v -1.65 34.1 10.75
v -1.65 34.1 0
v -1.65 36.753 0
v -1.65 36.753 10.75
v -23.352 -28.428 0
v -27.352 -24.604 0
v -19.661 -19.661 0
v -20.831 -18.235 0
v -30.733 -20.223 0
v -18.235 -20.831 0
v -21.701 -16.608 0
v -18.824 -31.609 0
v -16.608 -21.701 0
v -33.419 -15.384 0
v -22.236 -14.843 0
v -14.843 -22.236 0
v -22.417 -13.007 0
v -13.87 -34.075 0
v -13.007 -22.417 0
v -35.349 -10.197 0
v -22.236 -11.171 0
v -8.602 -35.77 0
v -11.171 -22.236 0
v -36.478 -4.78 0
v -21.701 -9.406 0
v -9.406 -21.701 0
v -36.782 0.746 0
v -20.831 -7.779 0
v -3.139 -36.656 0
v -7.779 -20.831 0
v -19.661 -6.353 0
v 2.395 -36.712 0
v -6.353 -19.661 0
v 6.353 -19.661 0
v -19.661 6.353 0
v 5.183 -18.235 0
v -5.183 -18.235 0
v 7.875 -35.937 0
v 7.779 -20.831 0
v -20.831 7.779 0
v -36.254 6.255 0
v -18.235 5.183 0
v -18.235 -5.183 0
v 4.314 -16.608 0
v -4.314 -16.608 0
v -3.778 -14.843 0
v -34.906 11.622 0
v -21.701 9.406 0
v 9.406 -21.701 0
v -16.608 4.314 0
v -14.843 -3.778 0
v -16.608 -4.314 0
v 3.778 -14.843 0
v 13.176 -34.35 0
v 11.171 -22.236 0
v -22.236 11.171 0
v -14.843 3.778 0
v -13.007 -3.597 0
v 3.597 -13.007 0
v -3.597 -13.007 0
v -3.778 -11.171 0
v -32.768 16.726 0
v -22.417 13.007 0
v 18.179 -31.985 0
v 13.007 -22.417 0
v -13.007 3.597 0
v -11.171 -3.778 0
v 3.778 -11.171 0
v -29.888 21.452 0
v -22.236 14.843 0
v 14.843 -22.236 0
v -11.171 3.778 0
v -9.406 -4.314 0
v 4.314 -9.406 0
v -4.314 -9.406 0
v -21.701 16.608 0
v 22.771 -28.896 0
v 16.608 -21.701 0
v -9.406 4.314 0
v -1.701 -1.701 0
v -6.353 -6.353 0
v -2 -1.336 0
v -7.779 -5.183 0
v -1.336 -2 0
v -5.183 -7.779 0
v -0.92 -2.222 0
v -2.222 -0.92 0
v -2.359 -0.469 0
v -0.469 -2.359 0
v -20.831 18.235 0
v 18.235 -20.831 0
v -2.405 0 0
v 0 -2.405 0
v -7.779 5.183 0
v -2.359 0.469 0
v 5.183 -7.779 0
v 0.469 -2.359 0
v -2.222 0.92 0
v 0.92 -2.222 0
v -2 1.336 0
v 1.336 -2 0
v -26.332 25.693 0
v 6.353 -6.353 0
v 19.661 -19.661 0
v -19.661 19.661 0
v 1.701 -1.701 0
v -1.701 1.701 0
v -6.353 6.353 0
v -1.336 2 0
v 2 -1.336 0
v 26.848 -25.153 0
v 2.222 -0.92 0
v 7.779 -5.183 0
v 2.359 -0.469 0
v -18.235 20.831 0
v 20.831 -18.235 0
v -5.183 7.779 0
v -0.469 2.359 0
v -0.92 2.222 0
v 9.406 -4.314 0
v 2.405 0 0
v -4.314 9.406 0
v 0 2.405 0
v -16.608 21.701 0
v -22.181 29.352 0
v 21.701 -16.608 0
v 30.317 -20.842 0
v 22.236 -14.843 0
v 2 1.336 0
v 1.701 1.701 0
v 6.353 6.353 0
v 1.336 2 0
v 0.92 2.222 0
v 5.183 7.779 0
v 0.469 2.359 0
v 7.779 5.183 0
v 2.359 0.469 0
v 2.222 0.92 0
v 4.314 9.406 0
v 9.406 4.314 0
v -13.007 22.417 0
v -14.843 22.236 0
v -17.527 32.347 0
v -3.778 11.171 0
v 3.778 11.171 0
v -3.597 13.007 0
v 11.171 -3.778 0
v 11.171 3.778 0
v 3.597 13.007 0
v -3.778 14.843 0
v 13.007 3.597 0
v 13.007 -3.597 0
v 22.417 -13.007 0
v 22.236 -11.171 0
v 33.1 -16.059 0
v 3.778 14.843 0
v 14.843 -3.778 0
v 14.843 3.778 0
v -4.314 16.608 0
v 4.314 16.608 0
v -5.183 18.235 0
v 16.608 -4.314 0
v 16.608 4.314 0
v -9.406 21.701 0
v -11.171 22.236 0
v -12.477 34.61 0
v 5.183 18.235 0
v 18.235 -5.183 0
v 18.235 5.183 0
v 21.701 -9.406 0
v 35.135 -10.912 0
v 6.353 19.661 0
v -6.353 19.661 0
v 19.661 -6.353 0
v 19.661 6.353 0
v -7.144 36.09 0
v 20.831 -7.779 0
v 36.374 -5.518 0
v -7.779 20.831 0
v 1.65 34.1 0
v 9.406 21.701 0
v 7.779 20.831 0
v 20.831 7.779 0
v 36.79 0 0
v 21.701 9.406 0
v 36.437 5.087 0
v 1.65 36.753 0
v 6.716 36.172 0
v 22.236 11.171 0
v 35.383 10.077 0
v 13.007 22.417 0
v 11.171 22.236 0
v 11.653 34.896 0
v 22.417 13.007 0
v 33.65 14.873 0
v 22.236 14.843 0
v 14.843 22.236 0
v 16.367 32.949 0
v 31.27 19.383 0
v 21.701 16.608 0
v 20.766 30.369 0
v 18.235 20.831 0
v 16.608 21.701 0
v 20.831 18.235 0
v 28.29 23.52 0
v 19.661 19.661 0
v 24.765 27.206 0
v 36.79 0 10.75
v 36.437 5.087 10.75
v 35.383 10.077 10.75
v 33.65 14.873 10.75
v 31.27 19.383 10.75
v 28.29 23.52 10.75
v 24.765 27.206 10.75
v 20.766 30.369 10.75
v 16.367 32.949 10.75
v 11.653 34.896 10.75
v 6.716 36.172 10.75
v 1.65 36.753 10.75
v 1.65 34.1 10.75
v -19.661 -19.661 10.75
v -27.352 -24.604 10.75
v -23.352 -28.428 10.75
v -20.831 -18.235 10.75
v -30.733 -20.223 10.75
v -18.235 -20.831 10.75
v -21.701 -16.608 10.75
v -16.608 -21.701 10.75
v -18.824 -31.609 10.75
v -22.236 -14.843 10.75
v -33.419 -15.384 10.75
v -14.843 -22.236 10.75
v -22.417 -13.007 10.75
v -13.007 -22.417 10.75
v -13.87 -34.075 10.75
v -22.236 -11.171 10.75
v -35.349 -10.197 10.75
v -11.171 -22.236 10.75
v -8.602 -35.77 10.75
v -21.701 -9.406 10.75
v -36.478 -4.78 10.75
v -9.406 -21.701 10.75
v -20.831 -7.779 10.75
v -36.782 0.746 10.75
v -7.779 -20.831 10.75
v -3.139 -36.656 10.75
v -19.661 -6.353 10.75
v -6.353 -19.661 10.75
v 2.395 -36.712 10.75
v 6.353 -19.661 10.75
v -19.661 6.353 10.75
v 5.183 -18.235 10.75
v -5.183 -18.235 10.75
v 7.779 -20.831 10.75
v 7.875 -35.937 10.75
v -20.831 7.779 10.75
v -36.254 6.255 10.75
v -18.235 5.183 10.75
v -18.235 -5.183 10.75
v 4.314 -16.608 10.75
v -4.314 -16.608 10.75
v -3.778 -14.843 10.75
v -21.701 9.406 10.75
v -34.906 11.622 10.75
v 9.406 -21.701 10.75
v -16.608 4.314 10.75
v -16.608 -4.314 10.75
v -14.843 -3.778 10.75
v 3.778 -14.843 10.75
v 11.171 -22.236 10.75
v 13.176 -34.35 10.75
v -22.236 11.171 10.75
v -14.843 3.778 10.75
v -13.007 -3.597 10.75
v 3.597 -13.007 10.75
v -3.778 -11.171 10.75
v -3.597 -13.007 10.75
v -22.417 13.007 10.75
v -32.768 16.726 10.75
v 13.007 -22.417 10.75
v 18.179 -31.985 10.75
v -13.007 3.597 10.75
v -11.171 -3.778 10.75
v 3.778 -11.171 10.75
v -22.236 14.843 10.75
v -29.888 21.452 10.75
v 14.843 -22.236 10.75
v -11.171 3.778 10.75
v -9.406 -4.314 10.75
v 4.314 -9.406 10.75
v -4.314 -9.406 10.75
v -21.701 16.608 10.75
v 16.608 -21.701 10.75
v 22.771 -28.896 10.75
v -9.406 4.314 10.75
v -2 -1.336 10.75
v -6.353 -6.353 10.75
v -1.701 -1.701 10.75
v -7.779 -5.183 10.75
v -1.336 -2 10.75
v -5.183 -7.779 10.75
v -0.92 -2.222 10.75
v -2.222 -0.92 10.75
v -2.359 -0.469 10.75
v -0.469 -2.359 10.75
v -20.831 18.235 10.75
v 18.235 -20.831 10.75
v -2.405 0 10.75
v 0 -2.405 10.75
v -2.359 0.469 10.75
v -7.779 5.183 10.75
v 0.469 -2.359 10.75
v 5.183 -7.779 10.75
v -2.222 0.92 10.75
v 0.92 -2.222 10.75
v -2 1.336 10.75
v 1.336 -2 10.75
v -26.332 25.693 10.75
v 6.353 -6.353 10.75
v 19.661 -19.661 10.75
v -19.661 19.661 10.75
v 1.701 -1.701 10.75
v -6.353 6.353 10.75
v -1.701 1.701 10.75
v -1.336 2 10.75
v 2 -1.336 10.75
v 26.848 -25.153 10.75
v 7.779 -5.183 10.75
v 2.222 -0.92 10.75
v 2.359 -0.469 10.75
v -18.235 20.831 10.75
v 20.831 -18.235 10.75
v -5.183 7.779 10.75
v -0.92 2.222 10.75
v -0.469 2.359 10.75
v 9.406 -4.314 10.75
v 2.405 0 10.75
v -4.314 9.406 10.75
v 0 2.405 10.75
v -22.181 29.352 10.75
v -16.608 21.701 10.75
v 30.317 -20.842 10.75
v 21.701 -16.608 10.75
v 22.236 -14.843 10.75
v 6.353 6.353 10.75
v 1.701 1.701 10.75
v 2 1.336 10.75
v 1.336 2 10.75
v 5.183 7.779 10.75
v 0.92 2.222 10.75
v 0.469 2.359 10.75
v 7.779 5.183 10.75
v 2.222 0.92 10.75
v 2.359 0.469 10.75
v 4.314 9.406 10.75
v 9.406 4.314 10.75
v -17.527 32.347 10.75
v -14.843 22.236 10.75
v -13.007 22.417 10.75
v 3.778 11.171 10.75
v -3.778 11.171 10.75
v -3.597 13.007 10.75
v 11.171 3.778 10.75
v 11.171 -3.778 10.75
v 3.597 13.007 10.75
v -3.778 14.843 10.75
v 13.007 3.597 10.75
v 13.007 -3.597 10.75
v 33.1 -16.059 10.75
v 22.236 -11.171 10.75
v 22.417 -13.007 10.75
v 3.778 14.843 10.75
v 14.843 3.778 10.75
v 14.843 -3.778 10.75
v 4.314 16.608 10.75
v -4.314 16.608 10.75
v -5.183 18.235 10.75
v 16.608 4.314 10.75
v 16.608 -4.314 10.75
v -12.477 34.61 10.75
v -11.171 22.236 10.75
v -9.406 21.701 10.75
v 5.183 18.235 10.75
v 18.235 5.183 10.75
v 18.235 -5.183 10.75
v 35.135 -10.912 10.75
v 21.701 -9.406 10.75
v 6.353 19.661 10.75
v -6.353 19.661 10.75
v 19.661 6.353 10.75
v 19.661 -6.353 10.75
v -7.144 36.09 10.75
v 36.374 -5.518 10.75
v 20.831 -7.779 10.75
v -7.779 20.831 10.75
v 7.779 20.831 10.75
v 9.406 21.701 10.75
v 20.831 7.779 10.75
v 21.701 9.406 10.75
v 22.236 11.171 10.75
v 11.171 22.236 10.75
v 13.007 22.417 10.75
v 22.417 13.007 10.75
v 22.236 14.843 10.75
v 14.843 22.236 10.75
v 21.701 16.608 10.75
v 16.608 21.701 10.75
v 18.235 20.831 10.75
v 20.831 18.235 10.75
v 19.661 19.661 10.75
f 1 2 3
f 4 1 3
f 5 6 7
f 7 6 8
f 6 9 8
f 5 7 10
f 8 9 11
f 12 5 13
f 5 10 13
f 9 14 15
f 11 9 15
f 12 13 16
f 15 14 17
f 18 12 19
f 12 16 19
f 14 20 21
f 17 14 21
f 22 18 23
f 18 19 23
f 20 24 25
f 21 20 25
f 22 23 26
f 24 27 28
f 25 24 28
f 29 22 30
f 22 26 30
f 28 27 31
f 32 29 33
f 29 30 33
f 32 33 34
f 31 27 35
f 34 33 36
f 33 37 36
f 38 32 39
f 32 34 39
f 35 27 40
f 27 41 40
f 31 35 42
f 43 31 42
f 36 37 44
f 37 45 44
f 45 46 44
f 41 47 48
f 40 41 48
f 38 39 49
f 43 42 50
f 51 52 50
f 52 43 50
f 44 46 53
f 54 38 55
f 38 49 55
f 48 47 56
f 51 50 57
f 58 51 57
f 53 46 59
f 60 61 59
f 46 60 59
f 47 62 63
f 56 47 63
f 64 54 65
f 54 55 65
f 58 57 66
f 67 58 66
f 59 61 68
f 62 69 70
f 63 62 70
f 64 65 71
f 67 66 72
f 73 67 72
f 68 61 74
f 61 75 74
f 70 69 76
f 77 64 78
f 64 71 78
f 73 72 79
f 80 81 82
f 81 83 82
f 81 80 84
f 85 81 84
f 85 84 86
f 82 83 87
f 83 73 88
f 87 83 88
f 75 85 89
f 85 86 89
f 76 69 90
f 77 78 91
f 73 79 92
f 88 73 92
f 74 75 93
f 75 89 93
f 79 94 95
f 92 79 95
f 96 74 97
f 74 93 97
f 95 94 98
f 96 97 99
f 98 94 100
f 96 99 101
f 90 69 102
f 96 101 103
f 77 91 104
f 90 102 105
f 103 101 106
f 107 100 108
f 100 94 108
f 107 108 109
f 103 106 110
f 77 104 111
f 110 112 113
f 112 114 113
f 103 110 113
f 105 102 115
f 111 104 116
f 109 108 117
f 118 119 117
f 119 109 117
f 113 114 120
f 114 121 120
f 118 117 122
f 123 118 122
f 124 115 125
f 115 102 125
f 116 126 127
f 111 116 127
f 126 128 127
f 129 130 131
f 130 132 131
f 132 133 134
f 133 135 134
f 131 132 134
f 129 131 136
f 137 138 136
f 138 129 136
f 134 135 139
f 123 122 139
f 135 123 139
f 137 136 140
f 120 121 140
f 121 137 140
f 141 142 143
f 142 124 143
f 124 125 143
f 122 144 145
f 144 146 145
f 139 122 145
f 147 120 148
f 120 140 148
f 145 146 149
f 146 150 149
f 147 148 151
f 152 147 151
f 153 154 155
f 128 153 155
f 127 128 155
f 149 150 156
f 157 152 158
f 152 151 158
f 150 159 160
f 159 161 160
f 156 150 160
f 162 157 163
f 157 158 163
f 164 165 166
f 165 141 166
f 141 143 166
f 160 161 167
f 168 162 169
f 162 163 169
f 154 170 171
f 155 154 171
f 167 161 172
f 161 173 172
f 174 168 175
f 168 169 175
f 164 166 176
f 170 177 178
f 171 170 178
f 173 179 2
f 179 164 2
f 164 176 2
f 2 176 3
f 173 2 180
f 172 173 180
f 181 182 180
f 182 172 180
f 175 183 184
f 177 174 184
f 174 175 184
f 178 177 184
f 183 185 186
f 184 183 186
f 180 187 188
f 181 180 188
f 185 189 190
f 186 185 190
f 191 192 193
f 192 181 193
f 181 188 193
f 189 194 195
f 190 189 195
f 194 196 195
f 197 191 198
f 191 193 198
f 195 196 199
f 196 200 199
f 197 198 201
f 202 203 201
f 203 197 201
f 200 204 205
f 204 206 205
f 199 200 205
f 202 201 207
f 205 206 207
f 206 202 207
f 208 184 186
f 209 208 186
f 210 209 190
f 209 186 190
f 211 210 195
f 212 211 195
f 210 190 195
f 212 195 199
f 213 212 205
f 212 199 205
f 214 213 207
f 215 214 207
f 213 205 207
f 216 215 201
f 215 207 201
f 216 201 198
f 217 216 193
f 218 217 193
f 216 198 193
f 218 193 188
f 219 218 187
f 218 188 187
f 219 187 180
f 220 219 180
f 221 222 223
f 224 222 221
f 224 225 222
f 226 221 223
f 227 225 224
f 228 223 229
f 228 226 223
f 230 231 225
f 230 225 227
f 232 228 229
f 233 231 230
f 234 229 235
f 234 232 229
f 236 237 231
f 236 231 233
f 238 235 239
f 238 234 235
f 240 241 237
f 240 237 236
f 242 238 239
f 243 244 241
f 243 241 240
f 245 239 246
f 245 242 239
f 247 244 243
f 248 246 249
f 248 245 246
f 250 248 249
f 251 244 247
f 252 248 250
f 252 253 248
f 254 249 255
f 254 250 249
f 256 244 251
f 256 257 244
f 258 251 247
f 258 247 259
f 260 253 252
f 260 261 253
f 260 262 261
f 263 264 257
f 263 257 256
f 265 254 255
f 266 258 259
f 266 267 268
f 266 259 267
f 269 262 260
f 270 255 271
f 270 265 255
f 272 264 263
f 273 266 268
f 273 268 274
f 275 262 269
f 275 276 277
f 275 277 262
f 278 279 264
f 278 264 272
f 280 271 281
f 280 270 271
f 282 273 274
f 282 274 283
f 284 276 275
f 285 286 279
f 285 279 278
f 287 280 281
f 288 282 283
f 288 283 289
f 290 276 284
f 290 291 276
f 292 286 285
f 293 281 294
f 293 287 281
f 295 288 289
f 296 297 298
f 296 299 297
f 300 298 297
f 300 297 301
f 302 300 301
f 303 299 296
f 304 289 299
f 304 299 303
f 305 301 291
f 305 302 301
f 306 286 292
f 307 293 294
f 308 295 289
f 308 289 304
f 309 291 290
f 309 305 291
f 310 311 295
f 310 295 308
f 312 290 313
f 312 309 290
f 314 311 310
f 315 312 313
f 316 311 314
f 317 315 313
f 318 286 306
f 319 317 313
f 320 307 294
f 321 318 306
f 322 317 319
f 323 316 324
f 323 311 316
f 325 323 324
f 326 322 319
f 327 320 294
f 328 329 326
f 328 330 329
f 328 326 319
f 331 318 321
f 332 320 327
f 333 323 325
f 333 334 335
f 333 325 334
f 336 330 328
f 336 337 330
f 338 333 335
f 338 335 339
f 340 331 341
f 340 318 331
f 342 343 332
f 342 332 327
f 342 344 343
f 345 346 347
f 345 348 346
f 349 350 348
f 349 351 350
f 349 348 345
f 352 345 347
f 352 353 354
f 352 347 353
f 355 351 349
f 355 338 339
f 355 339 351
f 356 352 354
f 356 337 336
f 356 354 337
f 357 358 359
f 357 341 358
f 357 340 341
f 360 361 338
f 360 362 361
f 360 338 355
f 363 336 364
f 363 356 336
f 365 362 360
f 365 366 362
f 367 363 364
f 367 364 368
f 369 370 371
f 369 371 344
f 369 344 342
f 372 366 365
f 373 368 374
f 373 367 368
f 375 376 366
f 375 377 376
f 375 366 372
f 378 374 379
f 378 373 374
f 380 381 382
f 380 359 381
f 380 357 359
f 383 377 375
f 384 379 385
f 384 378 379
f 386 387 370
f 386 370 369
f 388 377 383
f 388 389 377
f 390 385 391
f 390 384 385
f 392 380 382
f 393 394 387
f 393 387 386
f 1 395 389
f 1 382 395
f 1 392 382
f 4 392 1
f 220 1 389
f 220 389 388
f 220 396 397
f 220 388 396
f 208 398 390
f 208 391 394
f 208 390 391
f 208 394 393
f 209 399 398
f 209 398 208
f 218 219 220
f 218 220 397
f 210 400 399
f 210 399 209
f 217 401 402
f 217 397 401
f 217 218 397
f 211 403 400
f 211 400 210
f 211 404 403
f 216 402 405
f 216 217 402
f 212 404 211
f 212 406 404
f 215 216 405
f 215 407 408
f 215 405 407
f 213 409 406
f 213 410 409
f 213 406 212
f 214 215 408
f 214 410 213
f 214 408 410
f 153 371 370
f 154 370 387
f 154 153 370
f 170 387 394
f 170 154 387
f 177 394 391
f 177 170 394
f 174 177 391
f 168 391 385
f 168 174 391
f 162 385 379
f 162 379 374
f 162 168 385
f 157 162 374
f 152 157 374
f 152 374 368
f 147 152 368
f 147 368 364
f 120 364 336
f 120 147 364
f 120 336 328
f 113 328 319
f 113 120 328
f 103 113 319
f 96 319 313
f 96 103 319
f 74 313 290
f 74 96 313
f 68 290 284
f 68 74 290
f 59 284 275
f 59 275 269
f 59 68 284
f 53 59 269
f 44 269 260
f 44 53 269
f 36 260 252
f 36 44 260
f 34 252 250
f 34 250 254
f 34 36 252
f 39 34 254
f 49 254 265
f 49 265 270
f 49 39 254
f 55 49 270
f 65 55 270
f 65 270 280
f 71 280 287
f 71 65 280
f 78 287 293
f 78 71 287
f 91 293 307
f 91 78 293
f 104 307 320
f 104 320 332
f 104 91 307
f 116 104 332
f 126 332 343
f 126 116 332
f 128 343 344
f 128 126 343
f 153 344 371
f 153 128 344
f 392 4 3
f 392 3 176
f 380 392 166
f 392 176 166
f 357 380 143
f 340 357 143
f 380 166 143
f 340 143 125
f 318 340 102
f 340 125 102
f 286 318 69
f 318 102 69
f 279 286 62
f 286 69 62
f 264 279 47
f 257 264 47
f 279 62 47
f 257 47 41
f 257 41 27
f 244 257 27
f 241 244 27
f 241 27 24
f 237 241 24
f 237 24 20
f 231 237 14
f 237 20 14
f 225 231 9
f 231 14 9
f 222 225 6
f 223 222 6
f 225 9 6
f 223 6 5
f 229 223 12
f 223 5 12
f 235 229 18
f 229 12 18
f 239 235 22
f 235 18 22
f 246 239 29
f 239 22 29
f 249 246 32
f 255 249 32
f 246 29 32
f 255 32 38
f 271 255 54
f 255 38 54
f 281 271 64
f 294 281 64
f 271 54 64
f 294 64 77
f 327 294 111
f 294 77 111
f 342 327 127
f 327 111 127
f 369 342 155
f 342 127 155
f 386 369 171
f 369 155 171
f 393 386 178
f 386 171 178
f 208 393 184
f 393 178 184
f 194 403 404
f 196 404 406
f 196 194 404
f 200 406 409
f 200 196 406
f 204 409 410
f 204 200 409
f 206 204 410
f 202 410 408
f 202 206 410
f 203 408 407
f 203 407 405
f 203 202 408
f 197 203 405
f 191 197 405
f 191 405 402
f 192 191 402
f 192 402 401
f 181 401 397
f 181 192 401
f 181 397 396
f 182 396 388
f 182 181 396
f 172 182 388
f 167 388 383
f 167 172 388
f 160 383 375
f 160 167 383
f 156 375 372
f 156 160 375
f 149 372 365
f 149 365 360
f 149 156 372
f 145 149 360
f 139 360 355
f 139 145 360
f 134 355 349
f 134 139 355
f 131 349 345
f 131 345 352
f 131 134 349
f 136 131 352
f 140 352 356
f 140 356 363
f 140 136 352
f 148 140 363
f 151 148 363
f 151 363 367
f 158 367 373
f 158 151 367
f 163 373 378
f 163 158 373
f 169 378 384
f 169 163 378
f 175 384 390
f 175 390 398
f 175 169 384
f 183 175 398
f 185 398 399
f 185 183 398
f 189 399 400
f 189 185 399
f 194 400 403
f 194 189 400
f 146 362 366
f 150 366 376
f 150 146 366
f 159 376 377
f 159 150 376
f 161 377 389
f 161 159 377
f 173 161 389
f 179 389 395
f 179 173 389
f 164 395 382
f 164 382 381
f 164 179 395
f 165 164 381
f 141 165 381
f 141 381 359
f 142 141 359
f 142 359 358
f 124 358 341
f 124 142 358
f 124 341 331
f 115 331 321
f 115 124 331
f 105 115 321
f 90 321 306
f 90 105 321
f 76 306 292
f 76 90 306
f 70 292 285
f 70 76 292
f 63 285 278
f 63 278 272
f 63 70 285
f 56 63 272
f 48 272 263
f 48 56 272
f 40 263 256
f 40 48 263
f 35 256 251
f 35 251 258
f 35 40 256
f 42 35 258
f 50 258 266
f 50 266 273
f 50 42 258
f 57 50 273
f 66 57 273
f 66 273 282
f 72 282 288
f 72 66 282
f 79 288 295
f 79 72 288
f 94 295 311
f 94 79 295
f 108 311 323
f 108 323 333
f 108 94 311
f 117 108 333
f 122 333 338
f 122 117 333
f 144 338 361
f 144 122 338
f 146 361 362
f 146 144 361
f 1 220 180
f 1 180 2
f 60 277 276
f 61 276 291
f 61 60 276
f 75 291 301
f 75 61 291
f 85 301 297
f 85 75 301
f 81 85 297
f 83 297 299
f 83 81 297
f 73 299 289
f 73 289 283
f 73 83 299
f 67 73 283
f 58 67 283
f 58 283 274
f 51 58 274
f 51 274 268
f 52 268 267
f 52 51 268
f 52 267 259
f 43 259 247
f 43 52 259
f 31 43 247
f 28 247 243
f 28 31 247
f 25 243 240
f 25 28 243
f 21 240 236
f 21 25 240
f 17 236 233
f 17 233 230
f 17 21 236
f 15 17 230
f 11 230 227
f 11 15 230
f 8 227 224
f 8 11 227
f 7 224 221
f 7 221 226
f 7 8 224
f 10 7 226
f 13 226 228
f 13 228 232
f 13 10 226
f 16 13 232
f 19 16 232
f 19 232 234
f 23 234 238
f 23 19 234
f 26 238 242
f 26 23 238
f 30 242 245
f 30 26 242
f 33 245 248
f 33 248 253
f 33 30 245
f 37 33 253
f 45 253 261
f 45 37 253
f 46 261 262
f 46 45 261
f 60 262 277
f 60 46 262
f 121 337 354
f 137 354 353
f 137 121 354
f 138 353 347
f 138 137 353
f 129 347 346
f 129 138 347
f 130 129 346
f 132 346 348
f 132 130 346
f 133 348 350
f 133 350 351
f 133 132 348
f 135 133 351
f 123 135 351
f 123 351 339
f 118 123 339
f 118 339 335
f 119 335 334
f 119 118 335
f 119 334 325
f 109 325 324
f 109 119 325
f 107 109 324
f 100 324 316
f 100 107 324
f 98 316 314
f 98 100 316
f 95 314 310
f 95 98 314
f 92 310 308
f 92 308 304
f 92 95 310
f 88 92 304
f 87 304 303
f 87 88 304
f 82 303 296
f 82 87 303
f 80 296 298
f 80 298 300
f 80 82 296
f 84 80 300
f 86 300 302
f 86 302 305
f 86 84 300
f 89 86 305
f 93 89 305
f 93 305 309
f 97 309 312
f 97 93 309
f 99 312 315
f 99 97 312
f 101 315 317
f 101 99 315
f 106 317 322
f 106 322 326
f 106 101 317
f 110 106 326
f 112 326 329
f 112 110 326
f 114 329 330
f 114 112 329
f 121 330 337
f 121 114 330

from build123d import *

# Parameters (mm, degrees)
F0_R     = 9.41
F0_R_2   = 2.405
F1_DEPTH = 10.75


with BuildPart() as f1:
    # F0 (on Top) → F1 (new body)
    with BuildSketch(Plane.XY):
        with BuildLine():
            ThreePointArc((-1.65, 36.752981), (-25.424404, -26.591423), (36.79, 0))
            ThreePointArc((36.79, 0), (26.591423, 25.424404), (1.65, 36.752981))
            Line((1.65, 36.752981), (1.65, 34.1))
            Line((1.65, 34.1), (0, 34.1))
            Line((0, 34.1), (-1.65, 34.1))
            Line((-1.65, 34.1), (-1.65, 36.752981))
        make_face()
        with Locations((-13.007229, -13.007229)):
            Circle(F0_R, mode=Mode.SUBTRACT)
        with Locations((13.007229, -13.007229)):
            Circle(F0_R, mode=Mode.SUBTRACT)
        with Locations((-13.007229, 13.007229)):
            Circle(F0_R, mode=Mode.SUBTRACT)
        Circle(F0_R_2, mode=Mode.SUBTRACT)
        with Locations((13.007229, 13.007229)):
            Circle(F0_R, mode=Mode.SUBTRACT)
    extrude(amount=F1_DEPTH)


solid = f1.part
